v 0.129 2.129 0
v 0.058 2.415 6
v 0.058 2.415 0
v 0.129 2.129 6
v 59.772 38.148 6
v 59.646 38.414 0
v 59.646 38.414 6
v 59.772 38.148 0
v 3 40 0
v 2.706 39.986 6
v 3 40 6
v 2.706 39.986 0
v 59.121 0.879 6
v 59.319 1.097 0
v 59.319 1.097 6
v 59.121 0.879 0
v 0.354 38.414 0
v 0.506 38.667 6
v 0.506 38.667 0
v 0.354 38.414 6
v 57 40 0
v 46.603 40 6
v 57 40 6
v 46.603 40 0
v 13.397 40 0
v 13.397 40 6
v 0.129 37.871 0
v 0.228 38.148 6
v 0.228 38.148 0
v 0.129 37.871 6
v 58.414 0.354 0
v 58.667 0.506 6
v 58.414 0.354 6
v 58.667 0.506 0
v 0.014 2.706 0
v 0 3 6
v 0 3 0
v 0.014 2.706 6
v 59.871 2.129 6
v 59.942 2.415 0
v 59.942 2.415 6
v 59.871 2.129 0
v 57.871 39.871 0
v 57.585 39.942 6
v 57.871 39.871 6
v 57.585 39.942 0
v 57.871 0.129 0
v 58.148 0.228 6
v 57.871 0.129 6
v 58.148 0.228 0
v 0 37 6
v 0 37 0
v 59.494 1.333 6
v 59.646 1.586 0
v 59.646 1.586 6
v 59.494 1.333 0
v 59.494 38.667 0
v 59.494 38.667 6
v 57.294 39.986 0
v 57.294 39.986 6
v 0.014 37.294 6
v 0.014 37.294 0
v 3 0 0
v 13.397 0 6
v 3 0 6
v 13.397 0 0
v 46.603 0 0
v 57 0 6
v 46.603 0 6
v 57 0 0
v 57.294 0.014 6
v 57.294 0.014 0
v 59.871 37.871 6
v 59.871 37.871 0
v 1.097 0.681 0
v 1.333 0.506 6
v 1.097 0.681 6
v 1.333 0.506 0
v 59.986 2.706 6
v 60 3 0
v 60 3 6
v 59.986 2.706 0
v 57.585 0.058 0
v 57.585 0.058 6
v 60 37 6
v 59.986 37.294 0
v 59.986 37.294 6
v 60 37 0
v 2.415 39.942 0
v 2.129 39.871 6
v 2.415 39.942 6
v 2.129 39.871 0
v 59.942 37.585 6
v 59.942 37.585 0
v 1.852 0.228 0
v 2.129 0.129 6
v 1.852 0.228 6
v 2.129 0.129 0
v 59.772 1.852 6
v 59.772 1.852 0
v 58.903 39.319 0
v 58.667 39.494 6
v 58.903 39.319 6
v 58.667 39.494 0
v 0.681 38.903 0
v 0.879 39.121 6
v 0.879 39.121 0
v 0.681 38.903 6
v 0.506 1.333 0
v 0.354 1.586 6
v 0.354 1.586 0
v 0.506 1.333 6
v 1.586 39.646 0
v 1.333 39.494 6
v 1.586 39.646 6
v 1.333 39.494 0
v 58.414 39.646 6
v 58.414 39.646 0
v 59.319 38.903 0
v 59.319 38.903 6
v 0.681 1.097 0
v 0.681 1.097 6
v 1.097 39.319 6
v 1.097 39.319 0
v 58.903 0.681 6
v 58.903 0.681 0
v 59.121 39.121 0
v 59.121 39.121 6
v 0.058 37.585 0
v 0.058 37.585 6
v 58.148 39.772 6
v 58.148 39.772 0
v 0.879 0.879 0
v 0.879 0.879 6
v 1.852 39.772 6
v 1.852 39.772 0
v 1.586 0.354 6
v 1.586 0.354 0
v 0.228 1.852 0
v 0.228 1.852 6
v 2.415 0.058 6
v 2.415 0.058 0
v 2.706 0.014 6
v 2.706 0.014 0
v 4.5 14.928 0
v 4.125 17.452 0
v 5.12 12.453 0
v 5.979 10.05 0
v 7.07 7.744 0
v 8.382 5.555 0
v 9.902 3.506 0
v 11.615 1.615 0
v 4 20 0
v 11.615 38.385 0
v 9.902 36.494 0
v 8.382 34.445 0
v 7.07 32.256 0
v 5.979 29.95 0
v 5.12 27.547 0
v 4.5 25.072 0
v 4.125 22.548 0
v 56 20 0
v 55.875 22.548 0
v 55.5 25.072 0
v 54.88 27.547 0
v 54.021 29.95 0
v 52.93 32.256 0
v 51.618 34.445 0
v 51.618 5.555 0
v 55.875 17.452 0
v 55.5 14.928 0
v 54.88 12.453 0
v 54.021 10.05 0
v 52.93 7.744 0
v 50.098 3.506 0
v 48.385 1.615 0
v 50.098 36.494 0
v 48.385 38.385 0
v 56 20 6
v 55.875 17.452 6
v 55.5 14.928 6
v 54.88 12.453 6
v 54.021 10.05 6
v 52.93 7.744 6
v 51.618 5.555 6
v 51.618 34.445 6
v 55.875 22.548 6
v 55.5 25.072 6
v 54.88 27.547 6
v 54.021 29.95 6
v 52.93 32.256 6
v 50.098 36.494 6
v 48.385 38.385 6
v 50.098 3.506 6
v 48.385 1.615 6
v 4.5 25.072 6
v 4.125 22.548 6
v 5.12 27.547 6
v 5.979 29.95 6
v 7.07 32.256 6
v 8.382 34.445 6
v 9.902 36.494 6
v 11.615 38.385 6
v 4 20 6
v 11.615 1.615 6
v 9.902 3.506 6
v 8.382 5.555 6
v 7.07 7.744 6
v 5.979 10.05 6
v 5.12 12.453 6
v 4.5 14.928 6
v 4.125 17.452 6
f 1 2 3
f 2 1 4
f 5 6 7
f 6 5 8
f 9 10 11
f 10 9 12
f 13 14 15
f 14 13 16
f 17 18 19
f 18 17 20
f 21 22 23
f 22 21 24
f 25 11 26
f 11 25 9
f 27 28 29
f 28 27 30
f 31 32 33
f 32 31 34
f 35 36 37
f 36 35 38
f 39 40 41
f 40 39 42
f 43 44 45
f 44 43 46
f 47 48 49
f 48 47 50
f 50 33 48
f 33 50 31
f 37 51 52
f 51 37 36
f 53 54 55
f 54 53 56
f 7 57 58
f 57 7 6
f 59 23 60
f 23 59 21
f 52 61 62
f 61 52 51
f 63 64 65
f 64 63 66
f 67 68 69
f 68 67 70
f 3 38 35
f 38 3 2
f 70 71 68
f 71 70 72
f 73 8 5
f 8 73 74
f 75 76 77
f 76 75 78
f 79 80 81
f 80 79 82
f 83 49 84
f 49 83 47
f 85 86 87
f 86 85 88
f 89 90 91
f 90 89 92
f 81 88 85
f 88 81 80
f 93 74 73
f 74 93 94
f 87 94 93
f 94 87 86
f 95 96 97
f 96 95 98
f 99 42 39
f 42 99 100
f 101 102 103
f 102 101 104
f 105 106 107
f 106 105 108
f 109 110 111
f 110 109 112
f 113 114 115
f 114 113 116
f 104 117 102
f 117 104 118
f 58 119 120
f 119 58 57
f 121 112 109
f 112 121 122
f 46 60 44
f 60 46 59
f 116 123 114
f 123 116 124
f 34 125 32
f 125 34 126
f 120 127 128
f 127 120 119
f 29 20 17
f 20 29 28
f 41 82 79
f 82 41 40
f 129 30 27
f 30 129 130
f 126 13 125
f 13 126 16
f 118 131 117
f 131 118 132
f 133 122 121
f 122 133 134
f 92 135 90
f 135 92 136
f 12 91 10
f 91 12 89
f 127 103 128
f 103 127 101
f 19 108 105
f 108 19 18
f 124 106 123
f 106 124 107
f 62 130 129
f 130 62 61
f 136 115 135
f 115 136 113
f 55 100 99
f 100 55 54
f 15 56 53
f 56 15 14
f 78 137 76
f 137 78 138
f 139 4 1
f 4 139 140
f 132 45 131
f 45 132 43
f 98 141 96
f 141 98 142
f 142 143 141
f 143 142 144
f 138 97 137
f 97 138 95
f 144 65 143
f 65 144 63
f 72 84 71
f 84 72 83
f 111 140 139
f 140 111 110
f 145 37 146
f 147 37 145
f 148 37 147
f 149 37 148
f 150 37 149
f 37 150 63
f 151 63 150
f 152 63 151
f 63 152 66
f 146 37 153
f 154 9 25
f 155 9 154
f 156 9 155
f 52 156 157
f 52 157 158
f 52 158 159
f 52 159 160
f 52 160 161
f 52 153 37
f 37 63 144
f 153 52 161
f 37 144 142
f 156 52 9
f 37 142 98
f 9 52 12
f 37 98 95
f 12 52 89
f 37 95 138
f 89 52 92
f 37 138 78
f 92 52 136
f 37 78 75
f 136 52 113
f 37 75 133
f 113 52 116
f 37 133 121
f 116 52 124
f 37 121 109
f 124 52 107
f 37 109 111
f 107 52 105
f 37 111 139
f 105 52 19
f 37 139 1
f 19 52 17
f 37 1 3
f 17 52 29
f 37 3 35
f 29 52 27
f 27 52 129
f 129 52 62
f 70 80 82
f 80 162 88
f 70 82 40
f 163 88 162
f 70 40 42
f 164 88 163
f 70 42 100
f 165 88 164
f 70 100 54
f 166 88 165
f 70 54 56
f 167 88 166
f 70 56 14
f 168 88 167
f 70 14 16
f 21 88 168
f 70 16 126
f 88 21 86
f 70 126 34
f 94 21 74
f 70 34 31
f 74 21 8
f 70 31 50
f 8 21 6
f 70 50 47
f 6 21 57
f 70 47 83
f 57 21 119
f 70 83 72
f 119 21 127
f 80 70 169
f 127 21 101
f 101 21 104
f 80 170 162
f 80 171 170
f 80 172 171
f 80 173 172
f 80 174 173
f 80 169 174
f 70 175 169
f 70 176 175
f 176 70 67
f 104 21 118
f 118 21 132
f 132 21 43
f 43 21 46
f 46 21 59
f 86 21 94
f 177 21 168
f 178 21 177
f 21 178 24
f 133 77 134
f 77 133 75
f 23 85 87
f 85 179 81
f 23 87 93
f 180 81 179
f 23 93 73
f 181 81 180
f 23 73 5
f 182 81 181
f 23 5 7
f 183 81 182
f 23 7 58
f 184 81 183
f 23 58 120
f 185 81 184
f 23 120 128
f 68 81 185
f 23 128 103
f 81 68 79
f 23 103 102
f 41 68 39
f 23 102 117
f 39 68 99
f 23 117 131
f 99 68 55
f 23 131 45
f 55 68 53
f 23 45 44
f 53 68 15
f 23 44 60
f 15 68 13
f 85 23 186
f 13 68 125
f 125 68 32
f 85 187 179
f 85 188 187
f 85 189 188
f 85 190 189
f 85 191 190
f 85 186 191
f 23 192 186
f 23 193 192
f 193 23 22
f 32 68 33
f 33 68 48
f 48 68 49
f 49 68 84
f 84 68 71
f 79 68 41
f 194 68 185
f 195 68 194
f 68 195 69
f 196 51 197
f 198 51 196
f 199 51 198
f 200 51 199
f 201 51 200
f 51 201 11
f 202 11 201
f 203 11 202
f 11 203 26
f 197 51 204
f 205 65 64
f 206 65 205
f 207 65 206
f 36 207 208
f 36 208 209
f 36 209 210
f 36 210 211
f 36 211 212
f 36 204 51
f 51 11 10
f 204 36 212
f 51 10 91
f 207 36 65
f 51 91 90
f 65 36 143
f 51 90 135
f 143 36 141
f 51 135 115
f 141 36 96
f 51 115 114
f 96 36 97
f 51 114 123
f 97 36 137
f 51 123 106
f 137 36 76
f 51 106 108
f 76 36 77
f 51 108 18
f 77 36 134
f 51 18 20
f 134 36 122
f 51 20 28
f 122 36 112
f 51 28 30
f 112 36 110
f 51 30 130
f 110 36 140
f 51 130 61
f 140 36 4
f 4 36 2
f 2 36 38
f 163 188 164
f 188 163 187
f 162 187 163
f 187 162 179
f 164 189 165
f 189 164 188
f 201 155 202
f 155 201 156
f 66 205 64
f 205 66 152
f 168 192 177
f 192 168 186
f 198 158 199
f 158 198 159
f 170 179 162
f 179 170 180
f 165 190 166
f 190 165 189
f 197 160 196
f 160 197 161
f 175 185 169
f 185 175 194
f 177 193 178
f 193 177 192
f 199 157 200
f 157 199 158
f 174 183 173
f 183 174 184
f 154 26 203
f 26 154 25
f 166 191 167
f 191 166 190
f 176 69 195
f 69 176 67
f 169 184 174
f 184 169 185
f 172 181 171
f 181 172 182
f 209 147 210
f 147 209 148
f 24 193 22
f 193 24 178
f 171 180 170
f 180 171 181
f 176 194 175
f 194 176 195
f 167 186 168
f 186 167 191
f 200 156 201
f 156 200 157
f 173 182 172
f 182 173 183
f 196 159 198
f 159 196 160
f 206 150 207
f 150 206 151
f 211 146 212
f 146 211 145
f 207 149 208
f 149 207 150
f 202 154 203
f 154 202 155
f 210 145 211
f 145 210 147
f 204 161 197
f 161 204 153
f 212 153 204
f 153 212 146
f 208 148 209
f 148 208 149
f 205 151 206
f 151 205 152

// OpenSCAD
// file: ../../config.scad
// Ebike Configuration
// All dimensions in mm

// =============================================================================
// RIDER PARAMETERS
// =============================================================================
rider_height = 173;
rider_weight = 55;

// =============================================================================
// FRAME GEOMETRY
// =============================================================================
frame_size = 520;                    // Seat tube center-to-top
top_tube_effective = 545;
head_tube_length = 140;
head_tube_angle = 70;
seat_tube_angle = 72;
chainstay_length = 460;
bb_drop = 65;
wheelbase = 1080;
standover_height = 450;              // Step-through
stack = 620;
reach = 370;

// =============================================================================
// TUBE DIAMETERS
// =============================================================================
head_tube_id = 44;                   // 1-1/8" straight steerer
head_tube_od = 49;
seat_tube_id = 27.2;                 // Standard seatpost
down_tube_od = 44;
top_tube_od = 32;
seat_stay_od = 16;
chainstay_od = 22;

// =============================================================================
// MOTOR CONFIGURATION
// =============================================================================
motor_type = "mid-drive";
bb_shell_width = 68;                 // BSA standard
bb_clearance_width = 120;

// =============================================================================
// DROPOUT PARAMETERS
// =============================================================================
dropout_material = "6061-T6";
dropout_thickness = 10;
dropout_width = 45;
dropout_height = 80;
dropout_axle_spacing = 142;          // Boost thru-axle
dropout_axle_diameter = 12;

// =============================================================================
// BOTTOM BRACKET SHELL
// =============================================================================
bb_shell_od = 42;
bb_shell_id = 34.8;                  // BSA threaded
bb_thread_tpi = 24;                  // BSA 1.37" x 24 TPI

// =============================================================================
// HEAD TUBE
// =============================================================================
// Uses head_tube_length, head_tube_id, head_tube_od from above

// =============================================================================
// SEAT COLLAR
// =============================================================================
seat_collar_id = 31.8;               // For 27.2mm post with shim
seat_collar_od = 38;
seat_collar_height = 25;

// =============================================================================
// MOTOR MOUNT
// =============================================================================
motor_mount_thickness = 8;
motor_mount_width = 120;
motor_mount_height = 100;

// =============================================================================
// BATTERY MOUNT
// =============================================================================
battery_mount_thickness = 6;
battery_mount_width = 60;
battery_mount_height = 40;
battery_mount_quantity = 4;

// =============================================================================
// BRAKE MOUNT (Post Mount)
// =============================================================================
brake_mount_thickness = 10;
brake_mount_width = 80;
brake_mount_height = 50;
brake_post_bolt_spacing = 74;        // Post mount standard
brake_rotor_size_front = 180;
brake_rotor_size_rear = 160;

// =============================================================================
// CABLE GUIDES
// =============================================================================
cable_guide_length = 25;
cable_guide_width = 15;
cable_guide_height = 8;
cable_guide_quantity = 6;

// =============================================================================
// HEADSET CUPS
// =============================================================================
headset_cup_od = 44;
headset_bearing_seat = 30;

// =============================================================================
// RACK/FENDER MOUNTS
// =============================================================================
rack_mount_length = 30;
rack_mount_width = 20;
rack_mount_height = 10;
rack_mount_thread = 5;               // M5
rack_mount_quantity = 4;

// =============================================================================
// GUSSET PLATES
// =============================================================================
gusset_thickness = 6;
gusset_width = 80;
gusset_height = 60;
gusset_quantity = 2;

// =============================================================================
// COMPOSITE FRAME TUBES (FibreSeeker 3)
// =============================================================================
// Wall thickness for carbon fiber reinforced tubes
tube_wall_thickness = 3;

// Down tube (curved for step-through)
down_tube_length = 650;              // Along curve
down_tube_curve_radius = 800;        // Radius of curve

// Seat tube
seat_tube_length = 520;              // frame_size
seat_tube_od = 34;                   // Outer diameter

// Chainstays
chainstay_wall = 2.5;

// Seat stays
seat_stay_length = 480;
seat_stay_wall = 2;

// =============================================================================
// TUBE SECTIONING (for build volume constraints)
// =============================================================================
// Joint design: internal aluminum sleeve with M6 through-bolts
joint_overlap = 30;                  // Overlap length per joint
joint_bolt_diameter = 6;             // M6 bolts
joint_bolt_count = 2;                // Bolts per joint

// Section counts
down_tube_sections = 3;
seat_tube_sections = 2;
chainstay_sections = 2;
seat_stay_sections = 2;

// Sleeve parameters (CNC milled aluminum) - for straight tubes
sleeve_wall_thickness = 2;
sleeve_length = 60;                  // Total sleeve length (2x overlap)

// Flange joint parameters (for curved down tube)
flange_thickness = 6;
flange_width = 60;                   // Width of flange plate
flange_height = 40;                  // Height of flange plate
flange_bolt_count = 4;               // Bolts per flange pair
flange_bolt_diameter = 6;            // M6 bolts
lap_overlap = 25;                    // Tube overlap at joint

// Bolt hole cutting length (must exceed max tube OD)
bolt_hole_length = 75;

// =============================================================================
// MANUFACTURING TOLERANCES
// =============================================================================
tolerance_press_fit = 0.05;
tolerance_general = 0.1;

// =============================================================================
// COMMON CONSTANTS
// =============================================================================
$fn = 64;                            // Circle resolution
epsilon = 0.01;                      // For boolean operations
// main file
// Down Tube Flange Plate
// CNC milled component for NestWorks C500
// Used in pairs to clamp lap-jointed tube sections

include <../../config.scad>

module down_tube_flange() {
    difference() {
        // Main plate - rounded rectangle
        linear_extrude(height = flange_thickness) {
            hull() {
                translate([flange_thickness/2, flange_thickness/2])
                    circle(r = flange_thickness/2);
                translate([flange_width - flange_thickness/2, flange_thickness/2])
                    circle(r = flange_thickness/2);
                translate([flange_thickness/2, flange_height - flange_thickness/2])
                    circle(r = flange_thickness/2);
                translate([flange_width - flange_thickness/2, flange_height - flange_thickness/2])
                    circle(r = flange_thickness/2);
            }
        }

        // Central tube hole (fits over expanded collar)
        translate([flange_width/2, flange_height/2, -epsilon])
            cylinder(h = flange_thickness + 2*epsilon, d = down_tube_od + 8);  // Clearance for collar OD

        // Bolt holes - 4 corners
        bolt_inset = 10;

        // Bottom left
        translate([bolt_inset, bolt_inset, -epsilon])
            cylinder(h = flange_thickness + 2*epsilon, d = flange_bolt_diameter + 0.5);

        // Bottom right
        translate([flange_width - bolt_inset, bolt_inset, -epsilon])
            cylinder(h = flange_thickness + 2*epsilon, d = flange_bolt_diameter + 0.5);

        // Top left
        translate([bolt_inset, flange_height - bolt_inset, -epsilon])
            cylinder(h = flange_thickness + 2*epsilon, d = flange_bolt_diameter + 0.5);

        // Top right
        translate([flange_width - bolt_inset, flange_height - bolt_inset, -epsilon])
            cylinder(h = flange_thickness + 2*epsilon, d = flange_bolt_diameter + 0.5);
    }
}

// Render for preview
down_tube_flange();
